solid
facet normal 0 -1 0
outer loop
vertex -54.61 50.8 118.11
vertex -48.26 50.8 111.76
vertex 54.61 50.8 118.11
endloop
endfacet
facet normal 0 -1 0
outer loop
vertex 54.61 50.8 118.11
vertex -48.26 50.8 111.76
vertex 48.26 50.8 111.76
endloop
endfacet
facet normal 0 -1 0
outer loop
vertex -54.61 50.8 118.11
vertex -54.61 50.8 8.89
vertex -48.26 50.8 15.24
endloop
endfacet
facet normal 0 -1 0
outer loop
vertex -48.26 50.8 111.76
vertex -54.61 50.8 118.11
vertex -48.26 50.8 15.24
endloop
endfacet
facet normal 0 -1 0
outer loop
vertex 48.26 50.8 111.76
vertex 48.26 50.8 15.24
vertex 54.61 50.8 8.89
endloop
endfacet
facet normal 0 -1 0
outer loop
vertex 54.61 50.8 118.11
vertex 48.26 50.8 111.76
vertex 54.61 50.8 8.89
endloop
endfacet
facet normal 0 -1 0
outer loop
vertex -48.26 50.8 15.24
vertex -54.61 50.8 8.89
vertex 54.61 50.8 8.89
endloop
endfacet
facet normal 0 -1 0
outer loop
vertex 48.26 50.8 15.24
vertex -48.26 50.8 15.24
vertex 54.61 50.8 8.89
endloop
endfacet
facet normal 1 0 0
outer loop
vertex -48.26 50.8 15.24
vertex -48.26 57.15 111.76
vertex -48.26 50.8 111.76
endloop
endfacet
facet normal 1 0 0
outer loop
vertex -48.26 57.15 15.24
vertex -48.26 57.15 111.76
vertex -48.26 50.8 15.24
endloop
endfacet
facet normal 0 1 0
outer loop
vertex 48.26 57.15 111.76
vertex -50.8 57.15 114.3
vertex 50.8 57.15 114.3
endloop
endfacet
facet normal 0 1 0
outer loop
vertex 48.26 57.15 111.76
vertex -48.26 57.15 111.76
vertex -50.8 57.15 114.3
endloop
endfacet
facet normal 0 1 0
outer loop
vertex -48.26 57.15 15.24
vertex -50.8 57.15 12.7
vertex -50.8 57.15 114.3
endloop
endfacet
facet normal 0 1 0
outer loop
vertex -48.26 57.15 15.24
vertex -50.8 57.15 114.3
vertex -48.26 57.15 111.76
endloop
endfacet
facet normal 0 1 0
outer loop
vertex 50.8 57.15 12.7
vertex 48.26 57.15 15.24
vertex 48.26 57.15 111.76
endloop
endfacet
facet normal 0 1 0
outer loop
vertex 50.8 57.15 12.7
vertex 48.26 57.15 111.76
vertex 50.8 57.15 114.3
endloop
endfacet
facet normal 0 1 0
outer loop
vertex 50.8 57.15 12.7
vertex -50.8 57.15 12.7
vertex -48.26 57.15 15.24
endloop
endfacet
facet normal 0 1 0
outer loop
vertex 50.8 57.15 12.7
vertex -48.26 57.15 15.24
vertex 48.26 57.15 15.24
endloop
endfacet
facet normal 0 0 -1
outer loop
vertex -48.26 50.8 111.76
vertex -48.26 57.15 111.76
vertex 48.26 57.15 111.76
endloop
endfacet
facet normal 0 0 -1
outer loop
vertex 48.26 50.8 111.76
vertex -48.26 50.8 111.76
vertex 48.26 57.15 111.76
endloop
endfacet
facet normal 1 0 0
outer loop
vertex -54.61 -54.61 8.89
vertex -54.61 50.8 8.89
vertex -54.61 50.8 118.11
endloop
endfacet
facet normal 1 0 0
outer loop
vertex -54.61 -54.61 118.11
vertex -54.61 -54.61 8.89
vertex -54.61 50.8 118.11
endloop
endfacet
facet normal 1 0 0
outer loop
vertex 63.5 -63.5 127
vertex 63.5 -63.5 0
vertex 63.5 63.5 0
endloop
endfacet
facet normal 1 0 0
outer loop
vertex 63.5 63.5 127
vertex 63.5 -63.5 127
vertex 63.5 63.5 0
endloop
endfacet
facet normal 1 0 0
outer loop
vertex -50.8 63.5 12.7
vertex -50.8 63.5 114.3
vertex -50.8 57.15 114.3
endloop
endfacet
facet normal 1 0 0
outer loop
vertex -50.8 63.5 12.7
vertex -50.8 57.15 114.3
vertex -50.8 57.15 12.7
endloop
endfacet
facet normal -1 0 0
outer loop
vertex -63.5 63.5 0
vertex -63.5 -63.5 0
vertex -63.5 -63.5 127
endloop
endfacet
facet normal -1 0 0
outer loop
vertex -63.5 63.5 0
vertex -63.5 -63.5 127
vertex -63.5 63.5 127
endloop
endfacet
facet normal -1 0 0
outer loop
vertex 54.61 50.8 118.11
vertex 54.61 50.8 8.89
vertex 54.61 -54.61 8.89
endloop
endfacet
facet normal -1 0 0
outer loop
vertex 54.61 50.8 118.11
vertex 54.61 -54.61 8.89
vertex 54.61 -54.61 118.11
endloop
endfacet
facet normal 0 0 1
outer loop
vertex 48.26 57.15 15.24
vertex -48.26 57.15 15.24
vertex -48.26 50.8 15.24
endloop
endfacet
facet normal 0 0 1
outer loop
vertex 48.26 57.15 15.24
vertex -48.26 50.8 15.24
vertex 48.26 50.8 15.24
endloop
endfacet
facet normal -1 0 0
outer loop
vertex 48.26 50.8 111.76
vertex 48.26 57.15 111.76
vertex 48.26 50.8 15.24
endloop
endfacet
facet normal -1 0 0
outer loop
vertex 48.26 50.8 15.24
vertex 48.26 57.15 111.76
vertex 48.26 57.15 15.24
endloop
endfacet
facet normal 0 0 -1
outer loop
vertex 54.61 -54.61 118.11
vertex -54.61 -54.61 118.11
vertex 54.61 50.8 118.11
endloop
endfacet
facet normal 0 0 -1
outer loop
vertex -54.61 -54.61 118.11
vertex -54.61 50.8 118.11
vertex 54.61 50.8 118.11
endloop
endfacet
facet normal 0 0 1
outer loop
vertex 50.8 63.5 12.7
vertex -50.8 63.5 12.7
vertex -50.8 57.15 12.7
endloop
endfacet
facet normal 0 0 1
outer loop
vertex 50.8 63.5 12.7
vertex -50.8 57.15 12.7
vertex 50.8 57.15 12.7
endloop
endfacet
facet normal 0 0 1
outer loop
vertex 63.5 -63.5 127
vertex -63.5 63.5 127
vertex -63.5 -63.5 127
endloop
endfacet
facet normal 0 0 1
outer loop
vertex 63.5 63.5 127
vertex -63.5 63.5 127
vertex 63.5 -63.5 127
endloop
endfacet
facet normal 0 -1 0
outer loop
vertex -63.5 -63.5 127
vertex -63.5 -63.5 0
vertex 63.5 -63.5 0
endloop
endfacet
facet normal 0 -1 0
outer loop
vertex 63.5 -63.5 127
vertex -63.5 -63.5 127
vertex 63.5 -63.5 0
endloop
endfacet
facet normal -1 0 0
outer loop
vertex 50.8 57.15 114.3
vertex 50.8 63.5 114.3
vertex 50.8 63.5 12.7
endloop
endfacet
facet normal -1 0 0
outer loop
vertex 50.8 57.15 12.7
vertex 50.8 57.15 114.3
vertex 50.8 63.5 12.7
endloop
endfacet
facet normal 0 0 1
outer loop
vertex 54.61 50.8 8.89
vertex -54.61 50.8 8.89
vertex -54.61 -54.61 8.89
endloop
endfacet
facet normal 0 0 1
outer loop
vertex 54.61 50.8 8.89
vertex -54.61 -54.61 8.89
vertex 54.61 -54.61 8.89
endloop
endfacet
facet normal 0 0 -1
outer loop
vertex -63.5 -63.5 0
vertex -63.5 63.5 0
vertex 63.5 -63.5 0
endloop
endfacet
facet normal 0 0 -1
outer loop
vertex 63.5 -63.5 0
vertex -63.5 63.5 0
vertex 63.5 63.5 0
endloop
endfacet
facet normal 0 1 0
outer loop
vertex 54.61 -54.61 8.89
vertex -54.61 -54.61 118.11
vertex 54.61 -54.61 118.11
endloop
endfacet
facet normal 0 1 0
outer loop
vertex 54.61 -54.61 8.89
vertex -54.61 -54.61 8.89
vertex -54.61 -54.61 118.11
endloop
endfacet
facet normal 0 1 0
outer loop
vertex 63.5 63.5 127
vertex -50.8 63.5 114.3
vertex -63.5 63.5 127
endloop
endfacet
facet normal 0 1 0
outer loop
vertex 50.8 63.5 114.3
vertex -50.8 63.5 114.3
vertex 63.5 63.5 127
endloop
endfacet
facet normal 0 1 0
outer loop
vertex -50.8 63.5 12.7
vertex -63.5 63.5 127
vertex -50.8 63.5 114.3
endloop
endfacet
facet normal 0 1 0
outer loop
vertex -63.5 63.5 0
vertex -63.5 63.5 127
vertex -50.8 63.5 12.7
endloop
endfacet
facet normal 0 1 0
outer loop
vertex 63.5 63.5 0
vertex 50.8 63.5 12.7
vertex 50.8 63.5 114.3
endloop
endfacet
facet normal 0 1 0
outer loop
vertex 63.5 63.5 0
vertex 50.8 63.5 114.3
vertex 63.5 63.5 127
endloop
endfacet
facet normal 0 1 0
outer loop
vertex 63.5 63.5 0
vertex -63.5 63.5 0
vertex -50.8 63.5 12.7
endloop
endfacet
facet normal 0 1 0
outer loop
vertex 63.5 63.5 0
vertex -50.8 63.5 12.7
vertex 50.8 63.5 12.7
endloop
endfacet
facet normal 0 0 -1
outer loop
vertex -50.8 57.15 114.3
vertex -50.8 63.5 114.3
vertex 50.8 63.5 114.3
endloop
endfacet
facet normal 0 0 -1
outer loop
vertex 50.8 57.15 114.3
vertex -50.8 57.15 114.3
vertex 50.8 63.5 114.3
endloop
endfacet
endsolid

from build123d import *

# Parameters (mm, degrees)
SKETCH1_W           = 127
SKETCH1_H           = 127
BOSS_EXTRUDE1_DEPTH = 127
SKETCH2_W           = 96.52
SKETCH2_H           = 96.52
CUT_EXTRUDE1_DEPTH  = 118.11
SKETCH3_W           = 101.6
SKETCH3_H           = 101.6
SKETCH3_W_2         = 96.52
SKETCH3_H_2         = 96.52
CUT_EXTRUDE2_DEPTH  = 6.35
SKETCH5_W           = 96.52
SKETCH5_H           = 105.41
CUT_EXTRUDE3_DEPTH  = 6.35
SKETCH6_W           = 109.22
SKETCH6_H           = 105.41
CUT_EXTRUDE4_DEPTH  = 6.35


with BuildPart() as part:
    # Sketch1 → Boss-Extrude1 (new body)
    with BuildSketch(Plane.XY):
        Rectangle(SKETCH1_W, SKETCH1_H)
    extrude(amount=BOSS_EXTRUDE1_DEPTH)

    # Sketch2 → Cut-Extrude1 (cut)
    with BuildSketch(Plane(origin=(0, 63.5, 0), x_dir=(1, 0, 0), z_dir=(0, 1, 0))):
        with Locations((0, -63.5)):
            Rectangle(SKETCH2_W, SKETCH2_H)
    extrude(amount=-CUT_EXTRUDE1_DEPTH, mode=Mode.SUBTRACT)

    # Sketch3 → Cut-Extrude2 (cut)
    with BuildSketch(Plane(origin=(0, 63.5, 0), x_dir=(1, 0, 0), z_dir=(0, 1, 0))):
        with Locations((0, -63.5)):
            Rectangle(SKETCH3_W, SKETCH3_H)
        with Locations((0, -63.5)):
            Rectangle(SKETCH3_W_2, SKETCH3_H_2, mode=Mode.SUBTRACT)
    extrude(amount=-CUT_EXTRUDE2_DEPTH, mode=Mode.SUBTRACT)

    # Sketch5 → Cut-Extrude3 (cut)
    with BuildSketch(Plane.XY.offset(15.24)):
        with Locations((0, -1.905)):
            Rectangle(SKETCH5_W, SKETCH5_H)
    cut_extrude3 = extrude(amount=-CUT_EXTRUDE3_DEPTH, mode=Mode.SUBTRACT)

    # Mirror1: Cut-Extrude3 across plane
    add(cut_extrude3.mirror(Plane(origin=(0, 0, 63.5), x_dir=(1, 0, 0), z_dir=(0, 0, -1))), mode=Mode.SUBTRACT)

    # Sketch6 → Cut-Extrude4 (cut)
    with BuildSketch(Plane.ZY.offset(-48.26)):
        with Locations((63.5, -1.905)):
            Rectangle(SKETCH6_W, SKETCH6_H)
    cut_extrude4 = extrude(amount=-CUT_EXTRUDE4_DEPTH, mode=Mode.SUBTRACT)

    # Mirror2: Cut-Extrude4 across plane
    add(cut_extrude4.mirror(Plane(origin=(0, 0, 0), x_dir=(0, 0, 1), z_dir=(1, 0, 0))), mode=Mode.SUBTRACT)


solid = part.part
